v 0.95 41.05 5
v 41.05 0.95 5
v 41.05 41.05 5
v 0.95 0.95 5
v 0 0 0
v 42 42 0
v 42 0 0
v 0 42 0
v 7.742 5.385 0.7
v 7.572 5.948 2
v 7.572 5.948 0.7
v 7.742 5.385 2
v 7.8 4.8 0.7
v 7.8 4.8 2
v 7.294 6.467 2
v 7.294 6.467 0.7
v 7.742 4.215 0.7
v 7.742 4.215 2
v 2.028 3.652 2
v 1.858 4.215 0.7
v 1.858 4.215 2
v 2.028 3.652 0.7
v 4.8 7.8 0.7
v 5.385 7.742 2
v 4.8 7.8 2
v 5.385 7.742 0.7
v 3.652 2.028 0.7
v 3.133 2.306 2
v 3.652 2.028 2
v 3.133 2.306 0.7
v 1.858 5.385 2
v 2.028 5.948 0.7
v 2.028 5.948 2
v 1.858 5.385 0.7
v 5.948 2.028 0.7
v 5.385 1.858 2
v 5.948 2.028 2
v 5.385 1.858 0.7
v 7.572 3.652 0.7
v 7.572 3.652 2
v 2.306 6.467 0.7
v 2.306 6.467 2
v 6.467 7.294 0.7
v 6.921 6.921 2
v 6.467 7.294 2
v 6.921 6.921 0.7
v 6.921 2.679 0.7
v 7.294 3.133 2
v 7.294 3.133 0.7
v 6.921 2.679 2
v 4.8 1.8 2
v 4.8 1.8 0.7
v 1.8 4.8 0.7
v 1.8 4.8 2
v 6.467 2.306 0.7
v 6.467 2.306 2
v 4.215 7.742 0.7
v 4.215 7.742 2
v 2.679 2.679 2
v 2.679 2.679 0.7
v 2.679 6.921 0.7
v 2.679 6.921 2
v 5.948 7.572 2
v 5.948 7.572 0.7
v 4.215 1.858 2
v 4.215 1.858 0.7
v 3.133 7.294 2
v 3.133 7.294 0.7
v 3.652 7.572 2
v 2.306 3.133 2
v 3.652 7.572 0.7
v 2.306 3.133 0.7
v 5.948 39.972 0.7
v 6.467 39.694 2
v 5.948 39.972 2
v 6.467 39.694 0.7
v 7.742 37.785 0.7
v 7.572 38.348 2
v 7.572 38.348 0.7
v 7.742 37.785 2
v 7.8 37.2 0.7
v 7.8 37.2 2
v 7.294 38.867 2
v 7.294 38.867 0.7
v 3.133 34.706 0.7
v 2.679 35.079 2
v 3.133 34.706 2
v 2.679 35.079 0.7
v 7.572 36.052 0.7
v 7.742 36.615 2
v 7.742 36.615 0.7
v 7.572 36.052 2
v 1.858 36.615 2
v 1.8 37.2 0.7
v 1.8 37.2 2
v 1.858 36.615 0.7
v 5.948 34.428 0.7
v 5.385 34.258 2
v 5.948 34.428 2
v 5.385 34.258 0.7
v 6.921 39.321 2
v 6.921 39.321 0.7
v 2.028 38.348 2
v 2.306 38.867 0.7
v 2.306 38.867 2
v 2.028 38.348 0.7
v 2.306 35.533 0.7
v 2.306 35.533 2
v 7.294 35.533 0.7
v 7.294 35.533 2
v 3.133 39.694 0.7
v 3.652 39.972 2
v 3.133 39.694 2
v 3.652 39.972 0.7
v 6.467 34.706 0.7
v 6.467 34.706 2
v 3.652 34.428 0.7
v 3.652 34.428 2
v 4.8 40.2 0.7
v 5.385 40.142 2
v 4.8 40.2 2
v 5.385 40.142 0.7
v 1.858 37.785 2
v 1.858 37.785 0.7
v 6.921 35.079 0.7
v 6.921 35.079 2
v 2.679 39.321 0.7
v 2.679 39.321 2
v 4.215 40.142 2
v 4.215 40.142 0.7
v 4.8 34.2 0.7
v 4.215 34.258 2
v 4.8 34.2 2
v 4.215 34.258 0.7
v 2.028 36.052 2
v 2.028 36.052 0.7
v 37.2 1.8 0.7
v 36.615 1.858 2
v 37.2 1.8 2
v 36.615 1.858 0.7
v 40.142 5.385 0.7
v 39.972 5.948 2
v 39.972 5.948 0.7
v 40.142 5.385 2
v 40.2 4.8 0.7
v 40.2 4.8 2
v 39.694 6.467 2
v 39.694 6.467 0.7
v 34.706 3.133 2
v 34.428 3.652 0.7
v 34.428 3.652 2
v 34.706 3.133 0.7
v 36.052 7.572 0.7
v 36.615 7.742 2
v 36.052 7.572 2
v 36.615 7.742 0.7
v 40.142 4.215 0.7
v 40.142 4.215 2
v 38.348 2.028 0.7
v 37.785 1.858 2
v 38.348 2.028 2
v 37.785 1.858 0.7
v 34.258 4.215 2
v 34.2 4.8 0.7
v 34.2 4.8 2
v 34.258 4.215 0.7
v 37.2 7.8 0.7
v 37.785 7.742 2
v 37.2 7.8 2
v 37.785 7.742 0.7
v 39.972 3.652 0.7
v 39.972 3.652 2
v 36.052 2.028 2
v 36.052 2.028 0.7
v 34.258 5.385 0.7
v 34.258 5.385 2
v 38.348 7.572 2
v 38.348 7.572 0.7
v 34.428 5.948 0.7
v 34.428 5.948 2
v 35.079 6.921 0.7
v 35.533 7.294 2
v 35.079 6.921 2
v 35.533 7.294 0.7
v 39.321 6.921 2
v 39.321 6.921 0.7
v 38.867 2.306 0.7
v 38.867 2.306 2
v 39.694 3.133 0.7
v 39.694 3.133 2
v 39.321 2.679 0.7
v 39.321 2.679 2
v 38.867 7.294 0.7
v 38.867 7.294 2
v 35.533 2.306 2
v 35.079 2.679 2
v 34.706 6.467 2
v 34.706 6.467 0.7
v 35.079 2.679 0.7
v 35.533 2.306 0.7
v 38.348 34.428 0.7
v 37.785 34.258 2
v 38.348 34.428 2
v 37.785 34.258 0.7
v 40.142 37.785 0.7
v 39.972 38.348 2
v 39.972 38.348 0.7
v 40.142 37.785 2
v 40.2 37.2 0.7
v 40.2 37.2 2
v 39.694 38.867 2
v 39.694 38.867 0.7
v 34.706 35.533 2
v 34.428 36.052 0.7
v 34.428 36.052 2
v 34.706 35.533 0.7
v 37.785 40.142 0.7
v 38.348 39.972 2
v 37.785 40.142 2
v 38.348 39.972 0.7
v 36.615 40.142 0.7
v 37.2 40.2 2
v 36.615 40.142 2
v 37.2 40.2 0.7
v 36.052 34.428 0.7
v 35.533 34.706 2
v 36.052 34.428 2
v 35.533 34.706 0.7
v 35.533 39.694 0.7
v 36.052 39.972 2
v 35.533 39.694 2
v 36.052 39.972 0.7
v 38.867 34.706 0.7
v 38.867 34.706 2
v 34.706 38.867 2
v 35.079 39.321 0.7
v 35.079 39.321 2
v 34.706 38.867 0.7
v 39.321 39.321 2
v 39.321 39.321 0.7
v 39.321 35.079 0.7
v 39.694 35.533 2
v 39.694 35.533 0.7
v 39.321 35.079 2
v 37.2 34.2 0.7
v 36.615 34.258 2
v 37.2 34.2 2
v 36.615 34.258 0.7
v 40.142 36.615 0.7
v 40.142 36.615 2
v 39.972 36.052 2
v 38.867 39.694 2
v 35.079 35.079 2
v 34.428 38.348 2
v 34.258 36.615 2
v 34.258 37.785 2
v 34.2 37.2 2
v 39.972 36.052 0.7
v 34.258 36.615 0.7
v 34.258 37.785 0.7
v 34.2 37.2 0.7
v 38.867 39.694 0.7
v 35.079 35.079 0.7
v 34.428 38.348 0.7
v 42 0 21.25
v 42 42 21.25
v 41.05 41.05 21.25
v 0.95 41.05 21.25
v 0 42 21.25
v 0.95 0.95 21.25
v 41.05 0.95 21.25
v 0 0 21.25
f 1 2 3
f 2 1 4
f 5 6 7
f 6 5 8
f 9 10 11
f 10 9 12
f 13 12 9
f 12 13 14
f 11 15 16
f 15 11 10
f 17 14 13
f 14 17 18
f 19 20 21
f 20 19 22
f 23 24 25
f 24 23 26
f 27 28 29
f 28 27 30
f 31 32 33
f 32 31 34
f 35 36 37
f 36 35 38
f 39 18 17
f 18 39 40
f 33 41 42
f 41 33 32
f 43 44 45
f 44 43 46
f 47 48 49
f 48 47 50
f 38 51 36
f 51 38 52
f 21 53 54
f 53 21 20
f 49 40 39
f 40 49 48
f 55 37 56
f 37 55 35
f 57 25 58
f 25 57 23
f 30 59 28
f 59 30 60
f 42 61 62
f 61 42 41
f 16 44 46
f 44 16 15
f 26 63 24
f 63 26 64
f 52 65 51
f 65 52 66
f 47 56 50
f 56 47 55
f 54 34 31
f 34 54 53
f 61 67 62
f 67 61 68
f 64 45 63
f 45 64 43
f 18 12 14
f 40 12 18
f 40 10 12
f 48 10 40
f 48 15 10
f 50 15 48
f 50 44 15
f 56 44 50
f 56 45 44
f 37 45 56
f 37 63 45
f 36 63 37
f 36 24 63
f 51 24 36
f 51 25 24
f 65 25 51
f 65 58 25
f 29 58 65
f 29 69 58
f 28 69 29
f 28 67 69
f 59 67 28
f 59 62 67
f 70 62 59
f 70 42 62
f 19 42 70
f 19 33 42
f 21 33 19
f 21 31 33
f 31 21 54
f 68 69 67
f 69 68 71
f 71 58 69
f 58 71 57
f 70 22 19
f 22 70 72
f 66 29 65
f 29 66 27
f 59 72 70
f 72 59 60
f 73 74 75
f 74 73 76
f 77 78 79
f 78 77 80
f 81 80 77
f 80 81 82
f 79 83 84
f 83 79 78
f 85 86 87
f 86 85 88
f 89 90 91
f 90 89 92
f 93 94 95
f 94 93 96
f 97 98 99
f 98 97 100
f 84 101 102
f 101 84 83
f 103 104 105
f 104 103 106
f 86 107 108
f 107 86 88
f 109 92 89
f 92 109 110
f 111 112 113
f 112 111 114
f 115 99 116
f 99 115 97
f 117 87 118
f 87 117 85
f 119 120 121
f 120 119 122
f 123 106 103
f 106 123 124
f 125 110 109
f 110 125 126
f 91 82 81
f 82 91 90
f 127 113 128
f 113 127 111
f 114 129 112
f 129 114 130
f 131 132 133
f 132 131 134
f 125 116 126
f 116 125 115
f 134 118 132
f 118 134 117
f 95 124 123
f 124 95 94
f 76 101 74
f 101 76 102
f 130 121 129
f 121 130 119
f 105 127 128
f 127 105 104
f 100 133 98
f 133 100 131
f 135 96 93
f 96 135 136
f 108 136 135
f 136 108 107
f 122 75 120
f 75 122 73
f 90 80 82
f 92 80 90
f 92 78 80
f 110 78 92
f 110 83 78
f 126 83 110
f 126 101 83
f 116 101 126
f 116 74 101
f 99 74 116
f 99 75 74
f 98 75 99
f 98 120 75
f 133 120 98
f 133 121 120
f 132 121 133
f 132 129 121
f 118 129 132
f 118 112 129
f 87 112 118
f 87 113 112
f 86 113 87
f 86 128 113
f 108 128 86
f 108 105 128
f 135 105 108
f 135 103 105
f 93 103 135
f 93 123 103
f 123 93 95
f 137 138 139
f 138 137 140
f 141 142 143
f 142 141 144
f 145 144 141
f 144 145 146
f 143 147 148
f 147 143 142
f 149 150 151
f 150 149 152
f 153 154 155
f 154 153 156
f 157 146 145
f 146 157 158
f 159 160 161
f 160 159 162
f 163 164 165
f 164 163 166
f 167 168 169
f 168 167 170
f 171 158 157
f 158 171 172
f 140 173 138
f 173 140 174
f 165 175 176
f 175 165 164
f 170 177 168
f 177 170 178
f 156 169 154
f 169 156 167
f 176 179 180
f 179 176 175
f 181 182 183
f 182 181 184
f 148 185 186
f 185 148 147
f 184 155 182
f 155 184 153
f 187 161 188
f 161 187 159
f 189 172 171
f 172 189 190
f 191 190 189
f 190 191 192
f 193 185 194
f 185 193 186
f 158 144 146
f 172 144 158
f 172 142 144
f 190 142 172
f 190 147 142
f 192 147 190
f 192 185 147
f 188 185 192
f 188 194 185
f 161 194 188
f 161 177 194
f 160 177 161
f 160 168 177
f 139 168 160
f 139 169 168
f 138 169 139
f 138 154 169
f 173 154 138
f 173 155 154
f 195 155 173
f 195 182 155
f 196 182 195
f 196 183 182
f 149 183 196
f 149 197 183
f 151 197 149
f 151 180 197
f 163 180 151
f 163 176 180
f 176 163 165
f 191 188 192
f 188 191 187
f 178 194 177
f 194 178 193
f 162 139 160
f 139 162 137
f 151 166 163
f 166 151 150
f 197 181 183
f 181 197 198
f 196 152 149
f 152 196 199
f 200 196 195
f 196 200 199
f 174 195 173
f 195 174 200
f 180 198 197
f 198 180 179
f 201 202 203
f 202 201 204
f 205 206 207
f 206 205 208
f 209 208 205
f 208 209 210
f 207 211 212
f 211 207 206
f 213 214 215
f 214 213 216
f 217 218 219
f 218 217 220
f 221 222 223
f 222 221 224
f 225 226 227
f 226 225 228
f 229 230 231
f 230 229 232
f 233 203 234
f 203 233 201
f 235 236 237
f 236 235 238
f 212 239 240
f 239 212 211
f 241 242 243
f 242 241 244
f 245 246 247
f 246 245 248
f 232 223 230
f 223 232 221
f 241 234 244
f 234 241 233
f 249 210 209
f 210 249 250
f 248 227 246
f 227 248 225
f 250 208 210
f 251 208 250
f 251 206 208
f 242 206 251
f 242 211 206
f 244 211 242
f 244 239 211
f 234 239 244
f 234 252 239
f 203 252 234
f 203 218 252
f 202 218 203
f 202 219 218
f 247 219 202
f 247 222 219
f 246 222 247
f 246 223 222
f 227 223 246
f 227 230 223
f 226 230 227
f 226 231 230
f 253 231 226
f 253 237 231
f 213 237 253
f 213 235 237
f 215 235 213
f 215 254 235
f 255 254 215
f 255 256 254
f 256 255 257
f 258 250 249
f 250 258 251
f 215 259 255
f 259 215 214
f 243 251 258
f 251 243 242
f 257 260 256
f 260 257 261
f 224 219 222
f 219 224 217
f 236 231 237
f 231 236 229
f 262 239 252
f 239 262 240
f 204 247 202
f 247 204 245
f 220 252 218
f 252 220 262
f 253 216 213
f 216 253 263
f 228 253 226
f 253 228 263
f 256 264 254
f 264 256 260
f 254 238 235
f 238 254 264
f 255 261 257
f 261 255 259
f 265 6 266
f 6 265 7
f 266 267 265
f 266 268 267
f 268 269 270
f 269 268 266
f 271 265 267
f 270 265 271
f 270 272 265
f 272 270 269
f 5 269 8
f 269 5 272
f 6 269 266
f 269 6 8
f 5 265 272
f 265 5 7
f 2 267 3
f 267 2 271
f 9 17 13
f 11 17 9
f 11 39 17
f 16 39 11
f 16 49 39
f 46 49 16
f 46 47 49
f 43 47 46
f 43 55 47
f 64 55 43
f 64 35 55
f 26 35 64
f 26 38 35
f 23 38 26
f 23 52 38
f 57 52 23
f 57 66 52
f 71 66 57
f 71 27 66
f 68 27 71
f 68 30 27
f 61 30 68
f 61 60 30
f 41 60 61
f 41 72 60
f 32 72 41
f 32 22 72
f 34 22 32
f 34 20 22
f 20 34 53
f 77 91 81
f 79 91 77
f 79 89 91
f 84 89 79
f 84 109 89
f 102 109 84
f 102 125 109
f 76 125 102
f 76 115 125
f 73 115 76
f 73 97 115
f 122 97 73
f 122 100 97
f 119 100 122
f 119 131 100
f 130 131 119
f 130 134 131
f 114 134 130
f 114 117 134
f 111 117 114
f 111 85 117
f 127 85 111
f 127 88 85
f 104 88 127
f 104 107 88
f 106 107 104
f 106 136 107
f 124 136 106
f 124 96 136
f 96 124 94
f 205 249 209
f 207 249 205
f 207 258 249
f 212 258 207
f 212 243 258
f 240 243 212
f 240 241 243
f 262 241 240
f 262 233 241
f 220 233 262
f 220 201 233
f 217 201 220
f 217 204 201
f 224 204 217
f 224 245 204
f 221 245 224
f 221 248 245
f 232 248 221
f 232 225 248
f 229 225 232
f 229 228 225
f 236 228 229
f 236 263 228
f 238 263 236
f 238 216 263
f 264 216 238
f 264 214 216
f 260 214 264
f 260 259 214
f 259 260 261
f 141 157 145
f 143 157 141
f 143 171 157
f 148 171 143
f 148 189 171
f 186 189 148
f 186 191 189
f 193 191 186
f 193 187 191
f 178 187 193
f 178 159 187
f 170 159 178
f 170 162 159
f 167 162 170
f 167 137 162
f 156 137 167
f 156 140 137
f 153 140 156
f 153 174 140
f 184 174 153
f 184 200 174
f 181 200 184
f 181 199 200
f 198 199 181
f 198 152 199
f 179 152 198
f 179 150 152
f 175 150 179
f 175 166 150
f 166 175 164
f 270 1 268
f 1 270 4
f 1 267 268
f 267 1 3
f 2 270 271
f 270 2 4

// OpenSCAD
// Gridfinity Basic Cup - Extended with Corner Rounding
// Based on ostat/gridfinity_extended_openscad
// Modified to add corner_radius parameter for easier printing
// License: GPL-3.0

/* [Box Dimensions] */
// Width in grid units (0.5 to 8)
width_units = 1; // [0.5:0.5:8]
// Depth in grid units (0.5 to 8)
depth_units = 1; // [0.5:0.5:8]
// Height in grid units (1 to 10)
height_units = 3; // [1:1:10]

/* [Wall Settings] */
// Wall thickness in mm
wall_thickness = 0.95; // [0.8:0.05:2.4]
// Floor thickness in mm
floor_thickness = 0.7; // [0.7:0.1:2.0]

/* [Magnets] */
// Enable magnet holes
magnet_enabled = true;
// Magnet diameter in mm
magnet_diameter = 6; // [3:0.5:10]
// Magnet depth in mm
magnet_depth = 2; // [1:0.5:5]

/* [Screws] */
// Enable screw holes
screw_enabled = false;
// Screw diameter in mm
screw_diameter = 3; // [2:0.5:6]

/* [Features] */
// Enable finger slide cutout
finger_slide = false;
// Position of finger slide
finger_slide_position = "front"; // [front, back, left, right]

/* [Label] */
// Enable label tab
label_enabled = false;
// Position of label tab
label_position = "front"; // [front, back, left, right]
// Label width percentage
label_width_percent = 100; // [20:5:100]

/* [Dividers] */
// Number of X dividers
dividers_x = 0; // [0:1:10]
// Number of Y dividers
dividers_y = 0; // [0:1:10]

/* [Style] */
// Lip style
lip_style = "standard"; // [none, standard, reduced]
// Base style
base_style = "standard"; // [standard, efficient, filled]

/* [Corner Rounding - NEW] */
// Corner radius in mm (0 = sharp corners)
corner_radius = 0; // [0:0.25:5]

// Constants
grid_unit = 42;
base_height = 5;
lip_height = 4.75;
stacking_lip = 2.15;

// Calculated dimensions
box_width = width_units * grid_unit;
box_depth = depth_units * grid_unit;
box_height = height_units * 7 + base_height;

// Rounded rectangle module
module rounded_rect(w, d, h, r) {
    if (r > 0) {
        hull() {
            translate([r, r, 0]) cylinder(h=h, r=r, $fn=32);
            translate([w-r, r, 0]) cylinder(h=h, r=r, $fn=32);
            translate([r, d-r, 0]) cylinder(h=h, r=r, $fn=32);
            translate([w-r, d-r, 0]) cylinder(h=h, r=r, $fn=32);
        }
    } else {
        cube([w, d, h]);
    }
}

// Base profile for Gridfinity stacking
module gridfinity_base_profile() {
    polygon(points=[
        [0, 0],
        [0.8, 0],
        [0.8, 0.8],
        [2.15, 2.15],
        [2.15, base_height],
        [0, base_height]
    ]);
}

// Single grid base
module grid_base(r=0) {
    difference() {
        union() {
            // Main base block
            translate([0.25, 0.25, 0])
            rounded_rect(grid_unit - 0.5, grid_unit - 0.5, base_height, r > 0 ? min(r, 2) : 0);
            
            // Stacking lip profile
            translate([grid_unit/2, grid_unit/2, 0])
            rotate_extrude($fn=64)
            translate([grid_unit/2 - 2.4, 0, 0])
            gridfinity_base_profile();
        }
        
        // Magnet holes
        if (magnet_enabled) {
            for (x = [4.8, grid_unit - 4.8])
            for (y = [4.8, grid_unit - 4.8])
            translate([x, y, -0.1])
            cylinder(d=magnet_diameter, h=magnet_depth + 0.1, $fn=32);
        }
        
        // Screw holes
        if (screw_enabled) {
            for (x = [4.8, grid_unit - 4.8])
            for (y = [4.8, grid_unit - 4.8])
            translate([x, y, -0.1])
            cylinder(d=screw_diameter, h=base_height + 0.2, $fn=32);
        }
    }
}

// Main box body
module box_body() {
    difference() {
        // Outer shell
        rounded_rect(box_width, box_depth, box_height, corner_radius);
        
        // Inner cavity
        translate([wall_thickness, wall_thickness, floor_thickness])
        rounded_rect(
            box_width - wall_thickness*2, 
            box_depth - wall_thickness*2, 
            box_height, 
            corner_radius > 0 ? max(0, corner_radius - wall_thickness) : 0
        );
        
        // Stacking lip cutout at top
        if (lip_style != "none") {
            lip_h = lip_style == "reduced" ? lip_height * 0.6 : lip_height;
            translate([0, 0, box_height - lip_h])
            difference() {
                cube([box_width, box_depth, lip_h + 1]);
                translate([stacking_lip, stacking_lip, 0])
                rounded_rect(
                    box_width - stacking_lip*2,
                    box_depth - stacking_lip*2,
                    lip_h + 1,
                    corner_radius > 0 ? max(0, corner_radius - stacking_lip) : 0
                );
            }
        }
    }
}

// Finger slide cutout
module finger_slide_cut() {
    if (finger_slide) {
        slide_width = box_width * 0.6;
        slide_depth = 15;
        slide_height = box_height * 0.5;
        
        if (finger_slide_position == "front") {
            translate([(box_width - slide_width)/2, -1, box_height - slide_height])
            rotate([-30, 0, 0])
            cube([slide_width, slide_depth, slide_height]);
        } else if (finger_slide_position == "back") {
            translate([(box_width - slide_width)/2, box_depth - slide_depth + 1, box_height - slide_height])
            rotate([30, 0, 0])
            cube([slide_width, slide_depth, slide_height]);
        } else if (finger_slide_position == "left") {
            translate([-1, (box_depth - slide_width)/2, box_height - slide_height])
            rotate([0, 30, 0])
            cube([slide_depth, slide_width, slide_height]);
        } else if (finger_slide_position == "right") {
            translate([box_width - slide_depth + 1, (box_depth - slide_width)/2, box_height - slide_height])
            rotate([0, -30, 0])
            cube([slide_depth, slide_width, slide_height]);
        }
    }
}

// Label tab
module label_tab() {
    if (label_enabled) {
        tab_width = (box_width - wall_thickness*2) * (label_width_percent / 100);
        tab_height = 12;
        tab_depth = 1.2;
        
        if (label_position == "front") {
            translate([(box_width - tab_width)/2, -0.1, box_height - tab_height - lip_height])
            cube([tab_width, tab_depth + 0.1, tab_height]);
        } else if (label_position == "back") {
            translate([(box_width - tab_width)/2, box_depth - tab_depth, box_height - tab_height - lip_height])
            cube([tab_width, tab_depth + 0.1, tab_height]);
        } else if (label_position == "left") {
            translate([-0.1, (box_depth - tab_width)/2, box_height - tab_height - lip_height])
            cube([tab_depth + 0.1, tab_width, tab_height]);
        } else if (label_position == "right") {
            translate([box_width - tab_depth, (box_depth - tab_width)/2, box_height - tab_height - lip_height])
            cube([tab_depth + 0.1, tab_width, tab_height]);
        }
    }
}

// Dividers
module dividers() {
    if (dividers_x > 0 || dividers_y > 0) {
        inner_width = box_width - wall_thickness*2;
        inner_depth = box_depth - wall_thickness*2;
        divider_height = box_height - floor_thickness - lip_height;
        
        // X dividers
        if (dividers_x > 0) {
            spacing_x = inner_width / (dividers_x + 1);
            for (i = [1:dividers_x]) {
                translate([wall_thickness + i * spacing_x - 0.6, wall_thickness, floor_thickness])
                cube([1.2, inner_depth, divider_height]);
            }
        }
        
        // Y dividers
        if (dividers_y > 0) {
            spacing_y = inner_depth / (dividers_y + 1);
            for (i = [1:dividers_y]) {
                translate([wall_thickness, wall_thickness + i * spacing_y - 0.6, floor_thickness])
                cube([inner_width, 1.2, divider_height]);
            }
        }
    }
}

// Complete box
module gridfinity_box() {
    union() {
        // Base grid
        for (x = [0:width_units-1])
        for (y = [0:depth_units-1])
        translate([x * grid_unit, y * grid_unit, 0])
        grid_base(corner_radius);
        
        // Box body
        difference() {
            union() {
                box_body();
                label_tab();
            }
            finger_slide_cut();
        }
        
        // Dividers
        dividers();
    }
}

// Render
gridfinity_box();
